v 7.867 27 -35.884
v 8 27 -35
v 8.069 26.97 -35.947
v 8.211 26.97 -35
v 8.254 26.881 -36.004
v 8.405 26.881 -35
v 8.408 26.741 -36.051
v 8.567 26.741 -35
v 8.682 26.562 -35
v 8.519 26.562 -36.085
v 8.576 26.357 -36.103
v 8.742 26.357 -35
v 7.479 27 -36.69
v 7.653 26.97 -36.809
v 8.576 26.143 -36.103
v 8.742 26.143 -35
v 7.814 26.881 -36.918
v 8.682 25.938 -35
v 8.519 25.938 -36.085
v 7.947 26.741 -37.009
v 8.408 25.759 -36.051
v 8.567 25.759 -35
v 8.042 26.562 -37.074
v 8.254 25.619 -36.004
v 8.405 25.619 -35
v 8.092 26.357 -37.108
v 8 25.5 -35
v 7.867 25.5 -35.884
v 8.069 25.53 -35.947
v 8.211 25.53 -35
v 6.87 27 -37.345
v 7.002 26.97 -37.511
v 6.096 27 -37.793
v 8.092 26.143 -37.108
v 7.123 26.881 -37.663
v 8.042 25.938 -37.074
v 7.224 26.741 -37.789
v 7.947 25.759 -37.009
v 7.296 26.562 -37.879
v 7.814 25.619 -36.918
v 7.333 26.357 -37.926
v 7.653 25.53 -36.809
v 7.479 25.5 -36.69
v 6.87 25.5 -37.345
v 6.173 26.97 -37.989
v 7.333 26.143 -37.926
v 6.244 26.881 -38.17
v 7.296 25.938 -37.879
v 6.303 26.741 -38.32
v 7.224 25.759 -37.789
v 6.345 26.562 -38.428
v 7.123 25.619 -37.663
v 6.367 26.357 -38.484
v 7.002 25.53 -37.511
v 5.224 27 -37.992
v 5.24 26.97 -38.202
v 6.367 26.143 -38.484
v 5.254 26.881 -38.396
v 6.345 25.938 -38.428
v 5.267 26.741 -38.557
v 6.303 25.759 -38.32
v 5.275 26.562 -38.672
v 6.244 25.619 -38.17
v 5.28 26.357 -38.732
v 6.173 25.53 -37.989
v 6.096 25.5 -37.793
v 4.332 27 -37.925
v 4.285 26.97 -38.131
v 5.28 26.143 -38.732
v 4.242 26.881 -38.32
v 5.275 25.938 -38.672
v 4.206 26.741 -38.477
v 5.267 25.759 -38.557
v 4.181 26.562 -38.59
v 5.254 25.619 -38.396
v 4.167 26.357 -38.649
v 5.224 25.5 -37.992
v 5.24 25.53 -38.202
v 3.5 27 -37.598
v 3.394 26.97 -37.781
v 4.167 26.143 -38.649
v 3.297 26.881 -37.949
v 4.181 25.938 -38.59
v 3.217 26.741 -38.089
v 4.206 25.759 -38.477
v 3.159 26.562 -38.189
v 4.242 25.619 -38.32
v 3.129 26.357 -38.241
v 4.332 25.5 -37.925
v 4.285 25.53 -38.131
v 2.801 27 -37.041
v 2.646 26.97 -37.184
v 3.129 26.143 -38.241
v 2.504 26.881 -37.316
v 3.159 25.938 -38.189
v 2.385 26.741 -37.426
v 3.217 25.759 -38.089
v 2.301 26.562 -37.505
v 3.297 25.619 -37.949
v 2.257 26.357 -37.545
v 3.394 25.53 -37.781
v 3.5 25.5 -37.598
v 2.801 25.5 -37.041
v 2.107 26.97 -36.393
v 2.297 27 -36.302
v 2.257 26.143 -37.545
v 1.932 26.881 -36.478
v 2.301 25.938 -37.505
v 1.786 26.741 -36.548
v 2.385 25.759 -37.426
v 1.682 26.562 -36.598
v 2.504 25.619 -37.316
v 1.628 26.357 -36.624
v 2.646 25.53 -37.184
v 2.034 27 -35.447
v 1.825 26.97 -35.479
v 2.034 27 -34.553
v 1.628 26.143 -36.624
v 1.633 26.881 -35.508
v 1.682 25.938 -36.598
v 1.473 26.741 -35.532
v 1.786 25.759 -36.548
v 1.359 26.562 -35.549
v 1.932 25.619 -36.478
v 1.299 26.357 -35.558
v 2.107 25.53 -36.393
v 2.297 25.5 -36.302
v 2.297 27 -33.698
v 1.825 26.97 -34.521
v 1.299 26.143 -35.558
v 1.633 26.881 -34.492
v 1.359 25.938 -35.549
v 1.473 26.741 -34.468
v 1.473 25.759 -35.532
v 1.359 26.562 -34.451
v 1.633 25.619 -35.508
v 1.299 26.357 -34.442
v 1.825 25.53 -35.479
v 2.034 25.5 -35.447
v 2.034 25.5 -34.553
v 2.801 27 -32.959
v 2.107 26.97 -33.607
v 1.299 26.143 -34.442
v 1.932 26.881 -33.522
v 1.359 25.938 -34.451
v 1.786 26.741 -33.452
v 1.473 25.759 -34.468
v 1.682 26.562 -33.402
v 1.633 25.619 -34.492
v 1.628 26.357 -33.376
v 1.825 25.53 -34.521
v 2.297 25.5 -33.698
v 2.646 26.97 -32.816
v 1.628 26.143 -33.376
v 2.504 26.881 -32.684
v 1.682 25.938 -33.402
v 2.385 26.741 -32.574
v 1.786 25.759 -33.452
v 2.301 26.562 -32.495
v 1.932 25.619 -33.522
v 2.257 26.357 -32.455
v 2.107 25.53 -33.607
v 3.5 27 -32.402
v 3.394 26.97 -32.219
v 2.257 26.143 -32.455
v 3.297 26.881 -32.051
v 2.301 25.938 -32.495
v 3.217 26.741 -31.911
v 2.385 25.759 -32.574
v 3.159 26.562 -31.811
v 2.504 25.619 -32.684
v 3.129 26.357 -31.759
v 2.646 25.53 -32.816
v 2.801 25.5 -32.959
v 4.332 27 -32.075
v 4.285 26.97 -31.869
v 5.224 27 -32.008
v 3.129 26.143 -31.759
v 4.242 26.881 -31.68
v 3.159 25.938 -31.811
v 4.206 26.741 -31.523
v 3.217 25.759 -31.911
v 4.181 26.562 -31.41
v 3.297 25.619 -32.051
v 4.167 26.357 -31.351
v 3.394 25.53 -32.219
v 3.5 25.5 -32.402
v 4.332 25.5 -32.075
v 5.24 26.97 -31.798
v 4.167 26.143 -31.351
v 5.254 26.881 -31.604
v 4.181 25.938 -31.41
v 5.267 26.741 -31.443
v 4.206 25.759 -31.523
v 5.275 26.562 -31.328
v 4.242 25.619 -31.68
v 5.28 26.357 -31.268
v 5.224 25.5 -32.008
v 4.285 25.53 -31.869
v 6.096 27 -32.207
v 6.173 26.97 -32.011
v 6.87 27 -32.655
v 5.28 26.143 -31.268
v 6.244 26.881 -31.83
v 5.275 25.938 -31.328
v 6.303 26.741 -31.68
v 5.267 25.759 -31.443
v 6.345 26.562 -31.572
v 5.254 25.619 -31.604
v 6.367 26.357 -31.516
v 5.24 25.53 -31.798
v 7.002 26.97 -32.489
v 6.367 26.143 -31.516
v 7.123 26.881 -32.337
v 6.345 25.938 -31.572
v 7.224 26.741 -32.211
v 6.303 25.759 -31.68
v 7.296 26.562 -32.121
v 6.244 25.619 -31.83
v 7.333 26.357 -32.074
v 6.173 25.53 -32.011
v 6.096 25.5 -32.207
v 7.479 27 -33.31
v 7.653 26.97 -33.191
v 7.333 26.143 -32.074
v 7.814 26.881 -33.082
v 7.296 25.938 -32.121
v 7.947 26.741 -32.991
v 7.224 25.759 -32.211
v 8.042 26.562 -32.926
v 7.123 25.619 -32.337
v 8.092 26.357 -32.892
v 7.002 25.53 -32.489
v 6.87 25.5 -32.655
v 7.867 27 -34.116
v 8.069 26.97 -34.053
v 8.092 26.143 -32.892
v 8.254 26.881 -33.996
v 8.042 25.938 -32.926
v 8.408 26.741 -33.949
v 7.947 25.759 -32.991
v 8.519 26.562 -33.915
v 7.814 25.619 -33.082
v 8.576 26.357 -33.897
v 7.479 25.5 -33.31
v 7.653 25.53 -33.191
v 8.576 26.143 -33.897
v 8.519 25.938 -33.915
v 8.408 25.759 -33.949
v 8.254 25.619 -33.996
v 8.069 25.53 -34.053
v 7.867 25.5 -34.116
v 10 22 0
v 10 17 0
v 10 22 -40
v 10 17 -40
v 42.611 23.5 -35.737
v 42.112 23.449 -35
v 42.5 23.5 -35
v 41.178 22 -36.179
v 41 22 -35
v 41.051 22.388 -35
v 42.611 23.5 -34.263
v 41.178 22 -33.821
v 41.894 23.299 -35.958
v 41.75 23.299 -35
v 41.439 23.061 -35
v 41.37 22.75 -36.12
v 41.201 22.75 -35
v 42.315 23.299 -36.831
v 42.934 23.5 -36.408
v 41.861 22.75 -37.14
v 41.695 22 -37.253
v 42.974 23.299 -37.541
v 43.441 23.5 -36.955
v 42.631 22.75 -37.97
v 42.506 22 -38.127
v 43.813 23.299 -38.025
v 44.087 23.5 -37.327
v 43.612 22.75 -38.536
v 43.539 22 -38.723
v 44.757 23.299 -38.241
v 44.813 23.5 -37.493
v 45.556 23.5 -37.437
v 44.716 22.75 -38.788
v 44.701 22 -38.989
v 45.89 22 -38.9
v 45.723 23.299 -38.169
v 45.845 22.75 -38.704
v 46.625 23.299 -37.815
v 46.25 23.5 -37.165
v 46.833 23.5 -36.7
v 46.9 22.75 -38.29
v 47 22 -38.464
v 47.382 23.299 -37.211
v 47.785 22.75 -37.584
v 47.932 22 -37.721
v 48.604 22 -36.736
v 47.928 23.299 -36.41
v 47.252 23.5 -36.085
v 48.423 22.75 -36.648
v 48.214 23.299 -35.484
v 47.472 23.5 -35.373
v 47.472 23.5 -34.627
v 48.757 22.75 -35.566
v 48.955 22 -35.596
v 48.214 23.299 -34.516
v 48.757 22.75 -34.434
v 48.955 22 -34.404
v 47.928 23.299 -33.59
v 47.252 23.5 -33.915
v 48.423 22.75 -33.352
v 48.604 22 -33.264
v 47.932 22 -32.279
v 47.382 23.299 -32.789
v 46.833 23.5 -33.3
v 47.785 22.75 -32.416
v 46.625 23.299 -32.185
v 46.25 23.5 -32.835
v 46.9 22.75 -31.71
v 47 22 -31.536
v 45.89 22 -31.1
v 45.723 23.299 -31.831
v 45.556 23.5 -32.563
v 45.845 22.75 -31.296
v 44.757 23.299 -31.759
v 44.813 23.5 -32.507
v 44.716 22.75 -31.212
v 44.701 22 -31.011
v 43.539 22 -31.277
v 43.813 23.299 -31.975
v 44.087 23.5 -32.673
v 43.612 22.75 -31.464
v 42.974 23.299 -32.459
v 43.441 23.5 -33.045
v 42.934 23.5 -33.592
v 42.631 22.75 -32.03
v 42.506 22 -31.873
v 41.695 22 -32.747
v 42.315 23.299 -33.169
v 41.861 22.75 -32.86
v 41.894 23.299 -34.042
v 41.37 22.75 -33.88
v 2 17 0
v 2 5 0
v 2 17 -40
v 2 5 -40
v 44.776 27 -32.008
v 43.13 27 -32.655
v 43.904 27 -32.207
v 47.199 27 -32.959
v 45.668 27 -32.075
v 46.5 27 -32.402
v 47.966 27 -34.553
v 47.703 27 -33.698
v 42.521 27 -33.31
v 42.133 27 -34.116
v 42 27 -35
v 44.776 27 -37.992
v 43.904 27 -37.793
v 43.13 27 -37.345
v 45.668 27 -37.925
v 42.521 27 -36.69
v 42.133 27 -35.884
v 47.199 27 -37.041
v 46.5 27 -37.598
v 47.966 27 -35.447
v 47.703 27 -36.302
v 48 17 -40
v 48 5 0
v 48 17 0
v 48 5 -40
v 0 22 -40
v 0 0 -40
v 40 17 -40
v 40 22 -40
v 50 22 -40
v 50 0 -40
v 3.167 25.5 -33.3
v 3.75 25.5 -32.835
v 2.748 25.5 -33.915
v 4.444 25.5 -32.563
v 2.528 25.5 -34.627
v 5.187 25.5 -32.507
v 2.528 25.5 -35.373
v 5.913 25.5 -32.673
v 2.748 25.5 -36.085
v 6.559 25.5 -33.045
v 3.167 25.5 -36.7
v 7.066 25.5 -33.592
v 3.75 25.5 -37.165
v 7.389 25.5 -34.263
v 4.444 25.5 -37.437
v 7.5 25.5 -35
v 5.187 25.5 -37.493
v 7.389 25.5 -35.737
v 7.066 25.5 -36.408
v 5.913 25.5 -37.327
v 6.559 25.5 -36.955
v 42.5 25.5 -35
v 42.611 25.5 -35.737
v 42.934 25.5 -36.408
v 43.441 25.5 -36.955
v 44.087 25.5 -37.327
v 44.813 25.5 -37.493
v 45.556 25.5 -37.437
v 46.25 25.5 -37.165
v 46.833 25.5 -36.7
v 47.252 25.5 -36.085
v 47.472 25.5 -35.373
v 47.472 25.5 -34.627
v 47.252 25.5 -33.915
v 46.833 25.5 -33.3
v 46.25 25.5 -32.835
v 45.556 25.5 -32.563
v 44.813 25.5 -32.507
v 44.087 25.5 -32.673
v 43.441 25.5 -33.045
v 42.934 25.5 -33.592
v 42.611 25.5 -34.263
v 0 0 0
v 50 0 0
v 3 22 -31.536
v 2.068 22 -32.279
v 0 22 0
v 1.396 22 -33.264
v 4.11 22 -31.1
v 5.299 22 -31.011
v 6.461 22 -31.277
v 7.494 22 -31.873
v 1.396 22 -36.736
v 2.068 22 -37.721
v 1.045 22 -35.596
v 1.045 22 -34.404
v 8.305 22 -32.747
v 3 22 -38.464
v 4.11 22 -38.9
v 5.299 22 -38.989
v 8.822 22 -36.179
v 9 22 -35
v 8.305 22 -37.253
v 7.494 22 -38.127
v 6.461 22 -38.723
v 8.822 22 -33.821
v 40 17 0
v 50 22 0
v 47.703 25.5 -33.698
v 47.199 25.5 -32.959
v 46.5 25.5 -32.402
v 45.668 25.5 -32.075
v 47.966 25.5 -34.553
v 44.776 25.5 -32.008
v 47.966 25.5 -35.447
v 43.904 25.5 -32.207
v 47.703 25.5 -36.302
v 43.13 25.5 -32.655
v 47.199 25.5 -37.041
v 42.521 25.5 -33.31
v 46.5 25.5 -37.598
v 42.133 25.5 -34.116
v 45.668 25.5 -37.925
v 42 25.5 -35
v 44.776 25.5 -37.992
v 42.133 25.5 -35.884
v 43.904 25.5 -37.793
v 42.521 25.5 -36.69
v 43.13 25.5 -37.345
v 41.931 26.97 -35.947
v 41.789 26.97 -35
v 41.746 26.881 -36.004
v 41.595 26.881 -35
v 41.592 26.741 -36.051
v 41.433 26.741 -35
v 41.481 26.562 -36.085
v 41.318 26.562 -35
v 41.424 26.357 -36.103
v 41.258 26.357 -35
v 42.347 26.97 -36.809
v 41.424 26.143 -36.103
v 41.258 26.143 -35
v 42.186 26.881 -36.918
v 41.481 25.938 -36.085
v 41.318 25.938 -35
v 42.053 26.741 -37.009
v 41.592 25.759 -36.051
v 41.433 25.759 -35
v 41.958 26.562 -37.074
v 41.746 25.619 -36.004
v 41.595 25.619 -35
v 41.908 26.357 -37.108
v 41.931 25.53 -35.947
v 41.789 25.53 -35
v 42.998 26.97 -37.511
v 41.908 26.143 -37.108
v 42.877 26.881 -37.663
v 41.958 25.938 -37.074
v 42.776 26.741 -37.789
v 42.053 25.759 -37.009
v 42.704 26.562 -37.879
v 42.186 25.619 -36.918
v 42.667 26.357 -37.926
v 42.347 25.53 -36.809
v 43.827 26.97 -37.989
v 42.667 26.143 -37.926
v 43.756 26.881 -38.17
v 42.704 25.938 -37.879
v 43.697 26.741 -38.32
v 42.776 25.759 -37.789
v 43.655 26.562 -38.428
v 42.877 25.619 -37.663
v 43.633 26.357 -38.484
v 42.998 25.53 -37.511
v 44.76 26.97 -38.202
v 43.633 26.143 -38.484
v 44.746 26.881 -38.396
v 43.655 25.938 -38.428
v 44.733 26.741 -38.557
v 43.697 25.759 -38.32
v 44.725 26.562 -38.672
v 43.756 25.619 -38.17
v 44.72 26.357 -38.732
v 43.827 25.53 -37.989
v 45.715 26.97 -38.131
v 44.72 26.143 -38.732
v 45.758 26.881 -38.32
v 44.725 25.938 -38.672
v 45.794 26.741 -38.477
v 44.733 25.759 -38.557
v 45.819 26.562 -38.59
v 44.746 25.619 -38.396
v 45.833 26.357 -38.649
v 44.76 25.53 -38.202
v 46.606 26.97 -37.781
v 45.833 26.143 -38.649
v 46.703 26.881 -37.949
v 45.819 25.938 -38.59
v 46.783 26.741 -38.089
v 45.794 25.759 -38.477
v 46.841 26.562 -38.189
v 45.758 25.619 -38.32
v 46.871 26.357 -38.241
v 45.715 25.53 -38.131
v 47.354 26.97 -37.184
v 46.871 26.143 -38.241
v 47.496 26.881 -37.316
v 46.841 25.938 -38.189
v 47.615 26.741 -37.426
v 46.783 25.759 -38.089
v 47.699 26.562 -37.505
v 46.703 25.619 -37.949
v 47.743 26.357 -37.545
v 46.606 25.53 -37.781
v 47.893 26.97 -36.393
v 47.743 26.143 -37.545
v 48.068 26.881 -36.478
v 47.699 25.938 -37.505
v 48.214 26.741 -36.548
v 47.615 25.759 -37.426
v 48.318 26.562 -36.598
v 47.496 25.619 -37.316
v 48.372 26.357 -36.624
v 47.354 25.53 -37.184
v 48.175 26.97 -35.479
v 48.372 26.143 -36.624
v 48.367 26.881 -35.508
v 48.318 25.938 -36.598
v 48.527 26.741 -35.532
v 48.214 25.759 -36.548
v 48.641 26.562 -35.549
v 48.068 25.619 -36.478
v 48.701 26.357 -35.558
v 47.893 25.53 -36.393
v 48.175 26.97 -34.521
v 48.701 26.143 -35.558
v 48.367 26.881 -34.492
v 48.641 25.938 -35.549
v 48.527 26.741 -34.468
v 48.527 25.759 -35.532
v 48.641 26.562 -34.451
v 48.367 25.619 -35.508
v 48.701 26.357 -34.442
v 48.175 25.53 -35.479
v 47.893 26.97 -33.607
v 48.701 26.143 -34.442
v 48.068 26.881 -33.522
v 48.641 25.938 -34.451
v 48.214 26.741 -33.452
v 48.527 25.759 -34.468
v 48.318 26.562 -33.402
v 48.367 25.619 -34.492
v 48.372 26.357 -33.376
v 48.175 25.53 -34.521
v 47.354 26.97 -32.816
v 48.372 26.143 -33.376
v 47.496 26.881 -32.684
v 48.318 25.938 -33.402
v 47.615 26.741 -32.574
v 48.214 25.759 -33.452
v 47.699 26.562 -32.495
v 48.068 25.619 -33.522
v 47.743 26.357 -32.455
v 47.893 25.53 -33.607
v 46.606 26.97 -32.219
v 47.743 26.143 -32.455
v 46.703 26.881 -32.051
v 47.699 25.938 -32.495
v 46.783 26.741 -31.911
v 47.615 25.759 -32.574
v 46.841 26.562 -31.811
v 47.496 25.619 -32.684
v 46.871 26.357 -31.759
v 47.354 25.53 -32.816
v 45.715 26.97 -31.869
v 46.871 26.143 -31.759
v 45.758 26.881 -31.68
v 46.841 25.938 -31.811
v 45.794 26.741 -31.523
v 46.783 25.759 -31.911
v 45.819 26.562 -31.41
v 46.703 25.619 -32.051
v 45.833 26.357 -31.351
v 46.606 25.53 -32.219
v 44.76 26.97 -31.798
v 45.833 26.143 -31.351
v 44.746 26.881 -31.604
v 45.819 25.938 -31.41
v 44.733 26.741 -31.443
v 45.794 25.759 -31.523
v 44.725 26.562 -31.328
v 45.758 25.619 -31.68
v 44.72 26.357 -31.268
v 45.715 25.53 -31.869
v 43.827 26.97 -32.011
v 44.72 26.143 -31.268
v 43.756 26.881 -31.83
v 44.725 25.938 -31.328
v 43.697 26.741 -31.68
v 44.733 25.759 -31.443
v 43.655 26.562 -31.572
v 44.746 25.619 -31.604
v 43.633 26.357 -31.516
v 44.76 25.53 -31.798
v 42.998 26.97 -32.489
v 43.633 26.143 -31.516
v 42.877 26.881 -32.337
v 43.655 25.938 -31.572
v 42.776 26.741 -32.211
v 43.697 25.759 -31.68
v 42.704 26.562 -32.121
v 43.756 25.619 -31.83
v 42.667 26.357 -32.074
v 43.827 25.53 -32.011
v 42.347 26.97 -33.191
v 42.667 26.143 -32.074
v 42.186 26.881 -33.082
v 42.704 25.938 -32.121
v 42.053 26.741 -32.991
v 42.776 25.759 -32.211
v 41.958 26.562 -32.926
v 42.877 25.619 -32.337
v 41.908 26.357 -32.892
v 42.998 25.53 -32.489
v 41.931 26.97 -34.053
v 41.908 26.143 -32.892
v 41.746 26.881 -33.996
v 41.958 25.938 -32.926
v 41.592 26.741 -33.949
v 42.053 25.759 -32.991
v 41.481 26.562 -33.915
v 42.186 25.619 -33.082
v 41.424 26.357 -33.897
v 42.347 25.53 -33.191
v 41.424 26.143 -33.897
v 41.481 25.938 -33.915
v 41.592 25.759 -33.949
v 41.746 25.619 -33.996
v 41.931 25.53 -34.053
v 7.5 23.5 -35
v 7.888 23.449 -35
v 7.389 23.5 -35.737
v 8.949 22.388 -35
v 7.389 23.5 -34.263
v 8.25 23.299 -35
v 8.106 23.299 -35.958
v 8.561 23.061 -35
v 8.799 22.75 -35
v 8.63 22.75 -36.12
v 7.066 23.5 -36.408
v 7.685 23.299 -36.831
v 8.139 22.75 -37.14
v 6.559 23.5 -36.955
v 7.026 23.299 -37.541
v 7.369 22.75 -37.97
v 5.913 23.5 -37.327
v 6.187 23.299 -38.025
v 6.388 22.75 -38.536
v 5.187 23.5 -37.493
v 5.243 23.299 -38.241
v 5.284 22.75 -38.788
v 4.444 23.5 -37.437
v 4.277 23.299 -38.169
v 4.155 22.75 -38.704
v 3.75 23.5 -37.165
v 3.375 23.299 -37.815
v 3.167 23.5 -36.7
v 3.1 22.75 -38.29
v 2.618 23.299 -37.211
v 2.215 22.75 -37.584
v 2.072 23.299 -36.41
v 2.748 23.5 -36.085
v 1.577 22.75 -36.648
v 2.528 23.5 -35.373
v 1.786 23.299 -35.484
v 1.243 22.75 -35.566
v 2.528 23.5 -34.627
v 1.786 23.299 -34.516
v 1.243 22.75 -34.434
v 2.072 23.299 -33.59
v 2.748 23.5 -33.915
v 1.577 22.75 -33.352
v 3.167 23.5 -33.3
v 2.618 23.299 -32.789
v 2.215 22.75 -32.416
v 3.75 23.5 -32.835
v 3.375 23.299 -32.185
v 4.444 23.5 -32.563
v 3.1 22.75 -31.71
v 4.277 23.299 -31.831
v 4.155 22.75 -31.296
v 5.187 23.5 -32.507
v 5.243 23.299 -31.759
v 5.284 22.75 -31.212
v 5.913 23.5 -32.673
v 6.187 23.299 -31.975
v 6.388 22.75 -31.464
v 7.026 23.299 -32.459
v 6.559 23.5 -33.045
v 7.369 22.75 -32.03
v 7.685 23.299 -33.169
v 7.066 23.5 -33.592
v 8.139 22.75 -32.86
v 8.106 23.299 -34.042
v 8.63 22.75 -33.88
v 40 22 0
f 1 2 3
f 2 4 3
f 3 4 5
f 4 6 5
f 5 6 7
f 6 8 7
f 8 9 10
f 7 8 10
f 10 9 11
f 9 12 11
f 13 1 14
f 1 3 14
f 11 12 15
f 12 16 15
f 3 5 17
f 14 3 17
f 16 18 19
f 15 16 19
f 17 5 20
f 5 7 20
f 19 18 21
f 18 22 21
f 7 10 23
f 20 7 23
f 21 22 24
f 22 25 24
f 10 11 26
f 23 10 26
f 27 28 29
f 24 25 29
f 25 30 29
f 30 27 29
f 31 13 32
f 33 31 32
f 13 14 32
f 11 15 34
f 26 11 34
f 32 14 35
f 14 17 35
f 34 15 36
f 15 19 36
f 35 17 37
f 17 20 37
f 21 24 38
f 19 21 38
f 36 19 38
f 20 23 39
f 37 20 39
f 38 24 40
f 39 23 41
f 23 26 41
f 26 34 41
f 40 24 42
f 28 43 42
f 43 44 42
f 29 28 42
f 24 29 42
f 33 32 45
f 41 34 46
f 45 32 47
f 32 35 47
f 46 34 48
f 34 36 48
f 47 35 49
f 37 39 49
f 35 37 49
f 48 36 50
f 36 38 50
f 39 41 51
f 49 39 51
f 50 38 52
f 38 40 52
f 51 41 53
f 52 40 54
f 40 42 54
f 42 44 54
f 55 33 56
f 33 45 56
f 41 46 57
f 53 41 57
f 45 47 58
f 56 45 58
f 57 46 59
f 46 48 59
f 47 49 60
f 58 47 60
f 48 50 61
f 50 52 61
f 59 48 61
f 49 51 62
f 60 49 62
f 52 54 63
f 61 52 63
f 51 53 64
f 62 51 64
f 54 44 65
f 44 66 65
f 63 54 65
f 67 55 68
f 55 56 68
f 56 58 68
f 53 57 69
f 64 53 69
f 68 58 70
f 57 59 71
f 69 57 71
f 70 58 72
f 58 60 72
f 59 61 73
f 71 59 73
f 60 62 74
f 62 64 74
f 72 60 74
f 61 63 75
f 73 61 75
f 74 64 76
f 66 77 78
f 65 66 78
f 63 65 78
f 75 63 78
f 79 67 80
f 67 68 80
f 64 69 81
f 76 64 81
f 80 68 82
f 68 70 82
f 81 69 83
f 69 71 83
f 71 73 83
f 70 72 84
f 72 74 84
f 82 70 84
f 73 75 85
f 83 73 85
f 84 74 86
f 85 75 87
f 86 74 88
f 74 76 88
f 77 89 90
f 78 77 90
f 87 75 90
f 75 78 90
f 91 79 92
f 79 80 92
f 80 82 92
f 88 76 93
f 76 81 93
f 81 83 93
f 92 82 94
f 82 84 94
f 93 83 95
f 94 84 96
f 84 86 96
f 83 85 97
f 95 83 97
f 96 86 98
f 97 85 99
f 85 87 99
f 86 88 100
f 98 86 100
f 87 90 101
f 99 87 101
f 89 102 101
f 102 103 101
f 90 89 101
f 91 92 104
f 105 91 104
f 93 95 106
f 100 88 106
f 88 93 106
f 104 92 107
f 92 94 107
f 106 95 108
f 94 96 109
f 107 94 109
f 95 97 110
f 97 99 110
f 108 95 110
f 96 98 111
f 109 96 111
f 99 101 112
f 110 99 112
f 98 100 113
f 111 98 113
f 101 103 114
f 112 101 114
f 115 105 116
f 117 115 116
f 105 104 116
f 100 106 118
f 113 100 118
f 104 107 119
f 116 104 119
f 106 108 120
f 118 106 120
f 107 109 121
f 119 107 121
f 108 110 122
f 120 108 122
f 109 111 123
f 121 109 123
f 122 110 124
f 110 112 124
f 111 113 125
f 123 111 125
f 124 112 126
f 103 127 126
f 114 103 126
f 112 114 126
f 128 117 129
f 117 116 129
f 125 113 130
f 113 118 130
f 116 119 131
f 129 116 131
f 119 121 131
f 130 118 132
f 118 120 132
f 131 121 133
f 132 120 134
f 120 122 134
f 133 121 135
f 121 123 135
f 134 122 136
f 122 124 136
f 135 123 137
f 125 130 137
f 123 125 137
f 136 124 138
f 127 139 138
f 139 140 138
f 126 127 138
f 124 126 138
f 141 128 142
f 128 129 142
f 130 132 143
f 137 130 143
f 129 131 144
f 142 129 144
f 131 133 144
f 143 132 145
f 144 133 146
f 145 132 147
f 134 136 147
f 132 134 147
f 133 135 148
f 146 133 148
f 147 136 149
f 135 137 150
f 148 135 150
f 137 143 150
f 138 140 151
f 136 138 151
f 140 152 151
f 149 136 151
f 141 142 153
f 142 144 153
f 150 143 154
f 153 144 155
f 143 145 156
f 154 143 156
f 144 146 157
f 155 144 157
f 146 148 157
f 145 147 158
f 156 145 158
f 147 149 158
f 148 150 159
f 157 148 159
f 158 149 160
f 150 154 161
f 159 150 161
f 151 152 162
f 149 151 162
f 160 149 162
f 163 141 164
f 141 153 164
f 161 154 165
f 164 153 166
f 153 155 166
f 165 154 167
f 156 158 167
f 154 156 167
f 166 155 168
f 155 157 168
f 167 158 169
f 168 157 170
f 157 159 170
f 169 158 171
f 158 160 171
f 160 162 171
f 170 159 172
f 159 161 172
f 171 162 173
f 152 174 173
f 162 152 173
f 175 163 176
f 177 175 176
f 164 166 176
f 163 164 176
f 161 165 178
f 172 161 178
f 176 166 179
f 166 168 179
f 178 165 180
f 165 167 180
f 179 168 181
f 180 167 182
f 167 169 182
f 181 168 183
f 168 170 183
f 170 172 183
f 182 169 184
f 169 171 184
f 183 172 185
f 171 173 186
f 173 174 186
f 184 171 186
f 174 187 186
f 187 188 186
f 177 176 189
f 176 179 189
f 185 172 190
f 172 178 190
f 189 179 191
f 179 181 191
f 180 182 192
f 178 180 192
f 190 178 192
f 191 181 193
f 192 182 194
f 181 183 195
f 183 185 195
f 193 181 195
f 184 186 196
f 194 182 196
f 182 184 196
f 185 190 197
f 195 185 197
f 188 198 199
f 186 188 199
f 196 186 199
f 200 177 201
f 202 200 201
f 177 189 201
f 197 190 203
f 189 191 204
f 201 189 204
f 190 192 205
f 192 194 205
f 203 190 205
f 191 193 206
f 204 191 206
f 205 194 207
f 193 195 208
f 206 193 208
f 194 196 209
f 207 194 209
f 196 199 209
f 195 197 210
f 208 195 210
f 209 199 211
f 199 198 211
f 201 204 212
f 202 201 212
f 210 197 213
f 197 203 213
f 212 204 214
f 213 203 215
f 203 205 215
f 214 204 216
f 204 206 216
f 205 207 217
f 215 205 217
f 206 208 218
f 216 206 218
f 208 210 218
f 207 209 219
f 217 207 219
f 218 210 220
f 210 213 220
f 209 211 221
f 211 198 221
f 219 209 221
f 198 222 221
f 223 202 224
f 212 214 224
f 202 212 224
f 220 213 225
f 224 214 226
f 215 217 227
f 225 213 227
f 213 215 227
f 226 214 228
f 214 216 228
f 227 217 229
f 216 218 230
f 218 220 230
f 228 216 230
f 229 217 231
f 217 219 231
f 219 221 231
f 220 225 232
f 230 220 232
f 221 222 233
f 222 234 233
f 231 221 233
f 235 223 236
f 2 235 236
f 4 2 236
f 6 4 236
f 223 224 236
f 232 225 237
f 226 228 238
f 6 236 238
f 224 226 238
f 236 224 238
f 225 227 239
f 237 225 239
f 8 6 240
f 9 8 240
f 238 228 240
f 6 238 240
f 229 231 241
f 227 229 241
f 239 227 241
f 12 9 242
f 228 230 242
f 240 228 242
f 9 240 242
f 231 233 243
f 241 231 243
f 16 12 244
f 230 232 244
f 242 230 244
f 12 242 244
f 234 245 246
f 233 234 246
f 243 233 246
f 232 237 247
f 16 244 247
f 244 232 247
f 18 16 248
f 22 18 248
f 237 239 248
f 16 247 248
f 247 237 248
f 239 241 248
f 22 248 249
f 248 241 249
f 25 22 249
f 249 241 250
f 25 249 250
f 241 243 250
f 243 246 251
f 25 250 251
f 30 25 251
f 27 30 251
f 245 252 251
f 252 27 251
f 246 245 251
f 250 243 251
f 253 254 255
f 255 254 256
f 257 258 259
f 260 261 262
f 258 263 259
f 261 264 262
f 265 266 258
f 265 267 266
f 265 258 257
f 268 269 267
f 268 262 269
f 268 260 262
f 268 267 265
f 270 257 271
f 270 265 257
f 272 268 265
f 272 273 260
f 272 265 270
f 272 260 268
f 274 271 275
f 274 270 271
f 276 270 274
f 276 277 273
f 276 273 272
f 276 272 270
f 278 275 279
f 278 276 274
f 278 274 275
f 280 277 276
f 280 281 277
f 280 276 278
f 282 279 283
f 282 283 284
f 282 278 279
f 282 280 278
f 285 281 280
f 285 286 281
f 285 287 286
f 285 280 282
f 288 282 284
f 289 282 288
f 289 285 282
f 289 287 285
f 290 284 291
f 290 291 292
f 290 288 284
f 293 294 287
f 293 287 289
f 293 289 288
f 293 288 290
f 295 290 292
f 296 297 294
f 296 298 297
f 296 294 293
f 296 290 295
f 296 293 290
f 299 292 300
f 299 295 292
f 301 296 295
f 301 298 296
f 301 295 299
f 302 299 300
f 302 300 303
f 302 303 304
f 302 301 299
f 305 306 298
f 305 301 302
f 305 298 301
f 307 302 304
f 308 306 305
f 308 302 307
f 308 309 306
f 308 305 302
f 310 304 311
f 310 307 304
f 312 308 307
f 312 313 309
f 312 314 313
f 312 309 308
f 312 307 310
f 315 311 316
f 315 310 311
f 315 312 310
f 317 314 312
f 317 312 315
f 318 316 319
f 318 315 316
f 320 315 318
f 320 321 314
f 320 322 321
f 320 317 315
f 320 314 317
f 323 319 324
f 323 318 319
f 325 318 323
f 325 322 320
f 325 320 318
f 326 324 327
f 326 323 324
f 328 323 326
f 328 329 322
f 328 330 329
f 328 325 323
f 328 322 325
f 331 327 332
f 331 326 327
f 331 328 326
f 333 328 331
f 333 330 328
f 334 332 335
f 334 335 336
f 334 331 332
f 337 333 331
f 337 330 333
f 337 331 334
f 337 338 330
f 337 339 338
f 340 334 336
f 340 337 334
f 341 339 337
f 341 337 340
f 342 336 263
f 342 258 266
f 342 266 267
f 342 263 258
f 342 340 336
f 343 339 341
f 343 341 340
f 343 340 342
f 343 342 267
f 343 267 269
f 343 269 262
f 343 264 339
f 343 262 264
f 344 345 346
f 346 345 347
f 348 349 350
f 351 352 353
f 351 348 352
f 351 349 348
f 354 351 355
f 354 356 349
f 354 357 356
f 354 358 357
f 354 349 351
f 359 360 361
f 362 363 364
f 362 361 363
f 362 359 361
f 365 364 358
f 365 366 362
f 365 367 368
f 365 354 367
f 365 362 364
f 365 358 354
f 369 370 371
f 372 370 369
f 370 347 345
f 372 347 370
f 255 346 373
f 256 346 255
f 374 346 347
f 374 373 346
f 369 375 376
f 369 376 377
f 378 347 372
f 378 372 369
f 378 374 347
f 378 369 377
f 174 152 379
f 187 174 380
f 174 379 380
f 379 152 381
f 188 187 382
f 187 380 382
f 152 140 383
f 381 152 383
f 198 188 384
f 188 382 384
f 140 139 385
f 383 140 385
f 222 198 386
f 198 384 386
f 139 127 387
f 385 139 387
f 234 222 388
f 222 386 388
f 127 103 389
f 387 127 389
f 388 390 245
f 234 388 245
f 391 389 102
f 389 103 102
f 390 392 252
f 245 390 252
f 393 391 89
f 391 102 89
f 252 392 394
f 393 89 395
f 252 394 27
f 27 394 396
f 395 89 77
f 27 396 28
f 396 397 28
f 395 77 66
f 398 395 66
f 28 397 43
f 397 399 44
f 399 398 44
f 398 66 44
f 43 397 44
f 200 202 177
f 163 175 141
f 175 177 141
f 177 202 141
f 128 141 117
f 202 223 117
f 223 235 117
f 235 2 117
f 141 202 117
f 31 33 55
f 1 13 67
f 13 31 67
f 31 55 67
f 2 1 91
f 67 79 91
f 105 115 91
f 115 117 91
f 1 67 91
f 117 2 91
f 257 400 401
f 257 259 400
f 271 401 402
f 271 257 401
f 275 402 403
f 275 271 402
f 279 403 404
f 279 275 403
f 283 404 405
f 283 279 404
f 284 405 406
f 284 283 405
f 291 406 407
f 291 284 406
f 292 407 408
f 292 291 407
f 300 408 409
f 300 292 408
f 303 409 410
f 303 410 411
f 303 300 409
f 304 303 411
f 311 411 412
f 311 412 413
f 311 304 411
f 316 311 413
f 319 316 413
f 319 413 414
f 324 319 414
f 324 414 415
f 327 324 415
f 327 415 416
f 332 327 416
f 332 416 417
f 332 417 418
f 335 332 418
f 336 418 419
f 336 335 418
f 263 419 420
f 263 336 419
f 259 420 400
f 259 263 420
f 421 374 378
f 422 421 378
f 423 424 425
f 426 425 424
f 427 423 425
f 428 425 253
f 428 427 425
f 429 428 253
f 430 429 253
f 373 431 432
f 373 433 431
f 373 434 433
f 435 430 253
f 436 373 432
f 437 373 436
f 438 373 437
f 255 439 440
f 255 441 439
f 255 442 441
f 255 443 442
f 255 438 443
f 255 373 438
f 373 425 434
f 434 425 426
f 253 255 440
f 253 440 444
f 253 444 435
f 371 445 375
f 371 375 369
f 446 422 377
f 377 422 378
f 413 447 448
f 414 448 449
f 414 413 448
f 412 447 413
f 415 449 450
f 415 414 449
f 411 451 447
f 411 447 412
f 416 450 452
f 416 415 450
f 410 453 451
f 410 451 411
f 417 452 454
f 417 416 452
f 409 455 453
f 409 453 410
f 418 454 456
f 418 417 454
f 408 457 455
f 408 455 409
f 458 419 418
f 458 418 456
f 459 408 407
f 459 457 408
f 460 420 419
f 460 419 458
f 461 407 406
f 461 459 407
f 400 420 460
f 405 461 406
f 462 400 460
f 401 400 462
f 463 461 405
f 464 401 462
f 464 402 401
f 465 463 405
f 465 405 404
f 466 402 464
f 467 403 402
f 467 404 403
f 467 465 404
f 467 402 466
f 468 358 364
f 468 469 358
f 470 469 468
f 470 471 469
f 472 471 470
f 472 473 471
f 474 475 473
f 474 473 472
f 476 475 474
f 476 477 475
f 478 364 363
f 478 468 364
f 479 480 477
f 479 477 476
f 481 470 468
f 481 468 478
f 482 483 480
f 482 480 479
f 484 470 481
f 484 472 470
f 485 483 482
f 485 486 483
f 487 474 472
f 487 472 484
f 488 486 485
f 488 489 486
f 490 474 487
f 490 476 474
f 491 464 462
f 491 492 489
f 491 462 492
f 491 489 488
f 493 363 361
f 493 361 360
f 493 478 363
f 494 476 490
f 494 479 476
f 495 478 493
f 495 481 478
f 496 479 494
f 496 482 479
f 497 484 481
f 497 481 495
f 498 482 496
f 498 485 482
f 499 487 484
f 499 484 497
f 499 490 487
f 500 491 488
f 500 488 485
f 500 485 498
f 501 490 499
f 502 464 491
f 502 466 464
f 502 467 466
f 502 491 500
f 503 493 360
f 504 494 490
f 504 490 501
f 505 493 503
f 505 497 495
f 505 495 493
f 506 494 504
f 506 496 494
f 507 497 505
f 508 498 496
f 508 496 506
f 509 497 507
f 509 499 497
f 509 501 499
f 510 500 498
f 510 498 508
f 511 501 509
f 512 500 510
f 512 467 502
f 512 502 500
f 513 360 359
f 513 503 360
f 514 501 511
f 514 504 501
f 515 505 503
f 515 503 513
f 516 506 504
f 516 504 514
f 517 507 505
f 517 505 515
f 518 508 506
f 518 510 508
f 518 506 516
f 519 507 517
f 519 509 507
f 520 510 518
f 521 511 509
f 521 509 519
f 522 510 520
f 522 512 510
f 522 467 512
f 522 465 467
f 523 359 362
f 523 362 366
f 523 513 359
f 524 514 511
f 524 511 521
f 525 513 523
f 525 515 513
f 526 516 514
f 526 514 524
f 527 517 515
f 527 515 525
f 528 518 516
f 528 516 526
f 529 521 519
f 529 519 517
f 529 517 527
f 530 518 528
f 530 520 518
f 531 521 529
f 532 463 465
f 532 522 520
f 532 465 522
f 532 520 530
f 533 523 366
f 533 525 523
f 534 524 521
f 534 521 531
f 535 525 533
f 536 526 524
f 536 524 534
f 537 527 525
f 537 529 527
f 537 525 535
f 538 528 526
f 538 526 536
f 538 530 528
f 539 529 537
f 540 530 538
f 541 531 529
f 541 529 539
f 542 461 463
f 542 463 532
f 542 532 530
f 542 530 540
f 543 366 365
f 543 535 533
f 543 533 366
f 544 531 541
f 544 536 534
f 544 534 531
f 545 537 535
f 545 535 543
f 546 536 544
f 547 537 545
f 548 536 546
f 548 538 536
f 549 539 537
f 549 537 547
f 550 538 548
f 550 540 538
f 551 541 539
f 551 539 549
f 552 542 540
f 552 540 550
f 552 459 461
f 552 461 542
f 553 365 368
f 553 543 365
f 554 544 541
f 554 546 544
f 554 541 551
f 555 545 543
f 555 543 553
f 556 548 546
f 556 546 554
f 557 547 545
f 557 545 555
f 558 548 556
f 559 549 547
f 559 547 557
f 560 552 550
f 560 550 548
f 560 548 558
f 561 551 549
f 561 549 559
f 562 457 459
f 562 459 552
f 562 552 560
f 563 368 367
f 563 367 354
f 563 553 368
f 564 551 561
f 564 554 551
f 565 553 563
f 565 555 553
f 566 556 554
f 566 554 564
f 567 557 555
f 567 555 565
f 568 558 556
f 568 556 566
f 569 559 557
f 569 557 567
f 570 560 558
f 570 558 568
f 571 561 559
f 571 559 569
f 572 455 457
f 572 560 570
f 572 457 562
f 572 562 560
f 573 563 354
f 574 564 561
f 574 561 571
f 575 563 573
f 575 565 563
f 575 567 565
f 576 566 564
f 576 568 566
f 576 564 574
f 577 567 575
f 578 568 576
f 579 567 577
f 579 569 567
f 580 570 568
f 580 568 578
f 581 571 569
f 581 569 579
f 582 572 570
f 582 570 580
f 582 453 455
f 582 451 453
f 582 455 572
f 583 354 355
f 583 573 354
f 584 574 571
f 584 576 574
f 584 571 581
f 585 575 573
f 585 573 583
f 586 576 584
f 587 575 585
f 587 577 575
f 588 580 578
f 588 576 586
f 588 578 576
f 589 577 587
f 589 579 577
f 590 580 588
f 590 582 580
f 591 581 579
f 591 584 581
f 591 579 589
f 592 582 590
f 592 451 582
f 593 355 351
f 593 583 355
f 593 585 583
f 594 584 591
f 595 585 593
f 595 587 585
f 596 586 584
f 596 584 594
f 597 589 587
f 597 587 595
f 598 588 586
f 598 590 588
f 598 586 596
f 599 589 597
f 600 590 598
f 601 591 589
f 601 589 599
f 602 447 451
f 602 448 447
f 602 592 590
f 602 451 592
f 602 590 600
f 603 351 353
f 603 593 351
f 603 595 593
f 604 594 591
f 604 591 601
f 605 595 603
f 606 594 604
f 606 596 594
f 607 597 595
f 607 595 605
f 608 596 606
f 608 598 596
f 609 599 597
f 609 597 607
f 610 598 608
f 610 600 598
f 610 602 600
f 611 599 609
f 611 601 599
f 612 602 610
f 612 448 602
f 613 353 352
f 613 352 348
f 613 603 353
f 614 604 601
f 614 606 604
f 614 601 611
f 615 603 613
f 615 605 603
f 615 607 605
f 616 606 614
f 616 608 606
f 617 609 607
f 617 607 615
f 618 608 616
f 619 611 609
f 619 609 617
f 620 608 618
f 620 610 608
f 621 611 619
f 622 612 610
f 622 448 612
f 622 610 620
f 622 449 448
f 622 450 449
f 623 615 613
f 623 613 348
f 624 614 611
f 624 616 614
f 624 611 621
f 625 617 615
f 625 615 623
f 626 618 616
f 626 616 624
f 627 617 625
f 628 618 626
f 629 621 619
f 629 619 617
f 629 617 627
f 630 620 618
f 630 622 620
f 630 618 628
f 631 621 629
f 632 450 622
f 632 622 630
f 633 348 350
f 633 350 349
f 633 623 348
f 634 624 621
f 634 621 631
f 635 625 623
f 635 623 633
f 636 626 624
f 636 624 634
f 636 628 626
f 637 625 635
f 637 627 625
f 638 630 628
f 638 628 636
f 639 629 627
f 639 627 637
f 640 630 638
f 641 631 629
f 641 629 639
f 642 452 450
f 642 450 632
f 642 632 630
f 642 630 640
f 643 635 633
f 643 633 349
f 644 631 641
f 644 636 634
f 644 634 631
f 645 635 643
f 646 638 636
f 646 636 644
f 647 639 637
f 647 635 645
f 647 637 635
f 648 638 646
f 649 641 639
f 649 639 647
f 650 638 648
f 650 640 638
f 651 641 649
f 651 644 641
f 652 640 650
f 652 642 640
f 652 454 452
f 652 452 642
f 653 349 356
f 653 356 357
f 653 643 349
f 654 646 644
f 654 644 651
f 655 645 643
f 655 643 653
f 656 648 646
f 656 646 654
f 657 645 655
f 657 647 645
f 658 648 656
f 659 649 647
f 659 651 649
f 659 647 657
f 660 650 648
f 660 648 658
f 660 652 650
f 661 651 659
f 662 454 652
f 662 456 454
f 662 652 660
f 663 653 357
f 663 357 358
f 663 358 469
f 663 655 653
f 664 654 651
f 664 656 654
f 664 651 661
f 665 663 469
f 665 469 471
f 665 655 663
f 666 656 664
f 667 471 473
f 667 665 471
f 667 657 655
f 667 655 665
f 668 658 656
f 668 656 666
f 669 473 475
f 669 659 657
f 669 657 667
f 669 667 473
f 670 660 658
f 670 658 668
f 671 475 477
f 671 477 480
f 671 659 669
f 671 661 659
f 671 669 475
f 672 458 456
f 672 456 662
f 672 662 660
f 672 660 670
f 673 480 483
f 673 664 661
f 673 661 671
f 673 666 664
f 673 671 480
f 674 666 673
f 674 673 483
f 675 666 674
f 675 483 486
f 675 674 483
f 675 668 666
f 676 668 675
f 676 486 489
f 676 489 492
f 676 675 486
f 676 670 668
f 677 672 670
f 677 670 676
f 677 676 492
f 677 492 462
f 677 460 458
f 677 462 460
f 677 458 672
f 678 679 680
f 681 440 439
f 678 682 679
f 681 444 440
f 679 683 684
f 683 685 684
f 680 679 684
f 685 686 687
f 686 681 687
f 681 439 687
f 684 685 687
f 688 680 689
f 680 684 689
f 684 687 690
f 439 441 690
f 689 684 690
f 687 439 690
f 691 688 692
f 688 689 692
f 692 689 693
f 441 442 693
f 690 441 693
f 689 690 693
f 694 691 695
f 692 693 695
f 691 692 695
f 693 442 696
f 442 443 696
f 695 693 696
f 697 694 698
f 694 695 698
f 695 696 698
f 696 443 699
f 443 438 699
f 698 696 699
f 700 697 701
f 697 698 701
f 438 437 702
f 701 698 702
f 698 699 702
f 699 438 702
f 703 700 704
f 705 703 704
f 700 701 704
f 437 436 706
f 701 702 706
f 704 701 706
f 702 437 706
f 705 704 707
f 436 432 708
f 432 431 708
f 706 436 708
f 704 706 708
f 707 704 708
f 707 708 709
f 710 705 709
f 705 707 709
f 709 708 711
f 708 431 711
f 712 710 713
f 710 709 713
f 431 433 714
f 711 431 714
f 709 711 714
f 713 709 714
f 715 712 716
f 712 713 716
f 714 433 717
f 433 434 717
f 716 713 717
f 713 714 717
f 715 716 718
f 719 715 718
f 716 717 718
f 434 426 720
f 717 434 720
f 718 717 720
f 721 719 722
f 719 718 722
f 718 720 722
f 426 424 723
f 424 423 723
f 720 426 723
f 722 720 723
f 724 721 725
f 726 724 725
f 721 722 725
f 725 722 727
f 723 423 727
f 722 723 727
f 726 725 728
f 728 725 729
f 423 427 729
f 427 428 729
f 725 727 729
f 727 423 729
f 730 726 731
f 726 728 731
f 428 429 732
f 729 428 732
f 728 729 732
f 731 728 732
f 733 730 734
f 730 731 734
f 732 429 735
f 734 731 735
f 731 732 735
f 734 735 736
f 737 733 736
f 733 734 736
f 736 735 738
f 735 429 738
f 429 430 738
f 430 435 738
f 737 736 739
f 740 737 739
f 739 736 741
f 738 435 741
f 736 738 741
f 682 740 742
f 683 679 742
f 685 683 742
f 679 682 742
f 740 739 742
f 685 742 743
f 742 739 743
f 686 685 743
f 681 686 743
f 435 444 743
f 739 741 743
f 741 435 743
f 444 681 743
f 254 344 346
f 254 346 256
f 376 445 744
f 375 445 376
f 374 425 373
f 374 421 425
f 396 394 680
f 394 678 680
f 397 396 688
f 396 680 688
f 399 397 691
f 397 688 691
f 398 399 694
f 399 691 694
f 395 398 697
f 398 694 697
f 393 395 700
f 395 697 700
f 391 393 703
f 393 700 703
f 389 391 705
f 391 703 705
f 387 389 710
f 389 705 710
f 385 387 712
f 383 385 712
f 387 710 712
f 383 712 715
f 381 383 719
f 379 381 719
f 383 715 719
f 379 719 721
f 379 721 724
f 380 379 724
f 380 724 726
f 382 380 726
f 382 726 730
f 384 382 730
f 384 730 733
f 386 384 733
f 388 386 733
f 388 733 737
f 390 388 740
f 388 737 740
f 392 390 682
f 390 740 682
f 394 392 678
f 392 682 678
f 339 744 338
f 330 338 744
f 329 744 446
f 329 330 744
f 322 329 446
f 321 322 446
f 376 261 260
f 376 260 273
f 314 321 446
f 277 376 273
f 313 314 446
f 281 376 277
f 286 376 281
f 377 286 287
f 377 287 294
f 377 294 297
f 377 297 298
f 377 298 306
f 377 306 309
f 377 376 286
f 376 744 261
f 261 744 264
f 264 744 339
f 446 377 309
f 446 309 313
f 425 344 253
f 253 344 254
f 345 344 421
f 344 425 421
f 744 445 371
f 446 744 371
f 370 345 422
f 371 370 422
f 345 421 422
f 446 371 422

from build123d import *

# Parameters (mm, degrees)
SKETCH1_W           = 50
SKETCH1_H           = 40
BOSS_EXTRUDE2_DEPTH = 5
SKETCH2_W           = 2
SKETCH2_H           = 40
BOSS_EXTRUDE4_DEPTH = 12
SKETCH3_W           = 10
SKETCH3_H           = 40
BOSS_EXTRUDE5_DEPTH = 5


with BuildPart() as part:
    # Sketch1 → Boss-Extrude2 (new body)
    with BuildSketch(Plane(origin=(0, 0, 0), x_dir=(1, 0, 0), z_dir=(0, 1, 0))):
        with Locations((25, 20)):
            Rectangle(SKETCH1_W, SKETCH1_H)
    extrude(amount=BOSS_EXTRUDE2_DEPTH)

    # Sketch2 → Boss-Extrude4 (add)
    with BuildSketch(Plane(origin=(0, 5, 0), x_dir=(1, 0, 0), z_dir=(0, 1, 0))):
        with Locations((1, 20)):
            Rectangle(SKETCH2_W, SKETCH2_H)
        with Locations((49, 20)):
            Rectangle(SKETCH2_W, SKETCH2_H)
    extrude(amount=BOSS_EXTRUDE4_DEPTH)

    # Sketch3 → Boss-Extrude5 (add)
    with BuildSketch(Plane(origin=(0, 17, 0), x_dir=(1, 0, 0), z_dir=(0, 1, 0))):
        with Locations((5, 20)):
            Rectangle(SKETCH3_W, SKETCH3_H)
        with Locations((45, 20)):
            Rectangle(SKETCH3_W, SKETCH3_H)
    extrude(amount=BOSS_EXTRUDE5_DEPTH)

    # Sketch6 → Revolve8 (revolve)
    with BuildSketch(Plane.XY.offset(-35)):
        with BuildLine():
            Line((2.309155678, 22), (5, 22))
            Line((5, 22), (5, 23.5))
            Line((5, 23.5), (5, 25.5))
            Line((5, 25.5), (5, 27))
            Line((5, 27), (2, 27))
            ThreePointArc((2, 27), (1.25, 26.25), (2, 25.5))
            Line((2, 25.5), (2.5, 25.5))
            Line((2.5, 25.5), (2.5, 23.5))
            ThreePointArc((2.5, 23.5), (1.439339828, 23.060660172), (1, 22))
            Line((1, 22), (2.309155678, 22))
        make_face()
    revolve8 = revolve(axis=Axis((5, 22, -35), (0, 1, 0)))

    # Mirror1: Revolve8 across plane
    add(revolve8.mirror(Plane(origin=(25, 0, 0), x_dir=(0, 0, 1), z_dir=(1, 0, 0))))


solid = part.part
